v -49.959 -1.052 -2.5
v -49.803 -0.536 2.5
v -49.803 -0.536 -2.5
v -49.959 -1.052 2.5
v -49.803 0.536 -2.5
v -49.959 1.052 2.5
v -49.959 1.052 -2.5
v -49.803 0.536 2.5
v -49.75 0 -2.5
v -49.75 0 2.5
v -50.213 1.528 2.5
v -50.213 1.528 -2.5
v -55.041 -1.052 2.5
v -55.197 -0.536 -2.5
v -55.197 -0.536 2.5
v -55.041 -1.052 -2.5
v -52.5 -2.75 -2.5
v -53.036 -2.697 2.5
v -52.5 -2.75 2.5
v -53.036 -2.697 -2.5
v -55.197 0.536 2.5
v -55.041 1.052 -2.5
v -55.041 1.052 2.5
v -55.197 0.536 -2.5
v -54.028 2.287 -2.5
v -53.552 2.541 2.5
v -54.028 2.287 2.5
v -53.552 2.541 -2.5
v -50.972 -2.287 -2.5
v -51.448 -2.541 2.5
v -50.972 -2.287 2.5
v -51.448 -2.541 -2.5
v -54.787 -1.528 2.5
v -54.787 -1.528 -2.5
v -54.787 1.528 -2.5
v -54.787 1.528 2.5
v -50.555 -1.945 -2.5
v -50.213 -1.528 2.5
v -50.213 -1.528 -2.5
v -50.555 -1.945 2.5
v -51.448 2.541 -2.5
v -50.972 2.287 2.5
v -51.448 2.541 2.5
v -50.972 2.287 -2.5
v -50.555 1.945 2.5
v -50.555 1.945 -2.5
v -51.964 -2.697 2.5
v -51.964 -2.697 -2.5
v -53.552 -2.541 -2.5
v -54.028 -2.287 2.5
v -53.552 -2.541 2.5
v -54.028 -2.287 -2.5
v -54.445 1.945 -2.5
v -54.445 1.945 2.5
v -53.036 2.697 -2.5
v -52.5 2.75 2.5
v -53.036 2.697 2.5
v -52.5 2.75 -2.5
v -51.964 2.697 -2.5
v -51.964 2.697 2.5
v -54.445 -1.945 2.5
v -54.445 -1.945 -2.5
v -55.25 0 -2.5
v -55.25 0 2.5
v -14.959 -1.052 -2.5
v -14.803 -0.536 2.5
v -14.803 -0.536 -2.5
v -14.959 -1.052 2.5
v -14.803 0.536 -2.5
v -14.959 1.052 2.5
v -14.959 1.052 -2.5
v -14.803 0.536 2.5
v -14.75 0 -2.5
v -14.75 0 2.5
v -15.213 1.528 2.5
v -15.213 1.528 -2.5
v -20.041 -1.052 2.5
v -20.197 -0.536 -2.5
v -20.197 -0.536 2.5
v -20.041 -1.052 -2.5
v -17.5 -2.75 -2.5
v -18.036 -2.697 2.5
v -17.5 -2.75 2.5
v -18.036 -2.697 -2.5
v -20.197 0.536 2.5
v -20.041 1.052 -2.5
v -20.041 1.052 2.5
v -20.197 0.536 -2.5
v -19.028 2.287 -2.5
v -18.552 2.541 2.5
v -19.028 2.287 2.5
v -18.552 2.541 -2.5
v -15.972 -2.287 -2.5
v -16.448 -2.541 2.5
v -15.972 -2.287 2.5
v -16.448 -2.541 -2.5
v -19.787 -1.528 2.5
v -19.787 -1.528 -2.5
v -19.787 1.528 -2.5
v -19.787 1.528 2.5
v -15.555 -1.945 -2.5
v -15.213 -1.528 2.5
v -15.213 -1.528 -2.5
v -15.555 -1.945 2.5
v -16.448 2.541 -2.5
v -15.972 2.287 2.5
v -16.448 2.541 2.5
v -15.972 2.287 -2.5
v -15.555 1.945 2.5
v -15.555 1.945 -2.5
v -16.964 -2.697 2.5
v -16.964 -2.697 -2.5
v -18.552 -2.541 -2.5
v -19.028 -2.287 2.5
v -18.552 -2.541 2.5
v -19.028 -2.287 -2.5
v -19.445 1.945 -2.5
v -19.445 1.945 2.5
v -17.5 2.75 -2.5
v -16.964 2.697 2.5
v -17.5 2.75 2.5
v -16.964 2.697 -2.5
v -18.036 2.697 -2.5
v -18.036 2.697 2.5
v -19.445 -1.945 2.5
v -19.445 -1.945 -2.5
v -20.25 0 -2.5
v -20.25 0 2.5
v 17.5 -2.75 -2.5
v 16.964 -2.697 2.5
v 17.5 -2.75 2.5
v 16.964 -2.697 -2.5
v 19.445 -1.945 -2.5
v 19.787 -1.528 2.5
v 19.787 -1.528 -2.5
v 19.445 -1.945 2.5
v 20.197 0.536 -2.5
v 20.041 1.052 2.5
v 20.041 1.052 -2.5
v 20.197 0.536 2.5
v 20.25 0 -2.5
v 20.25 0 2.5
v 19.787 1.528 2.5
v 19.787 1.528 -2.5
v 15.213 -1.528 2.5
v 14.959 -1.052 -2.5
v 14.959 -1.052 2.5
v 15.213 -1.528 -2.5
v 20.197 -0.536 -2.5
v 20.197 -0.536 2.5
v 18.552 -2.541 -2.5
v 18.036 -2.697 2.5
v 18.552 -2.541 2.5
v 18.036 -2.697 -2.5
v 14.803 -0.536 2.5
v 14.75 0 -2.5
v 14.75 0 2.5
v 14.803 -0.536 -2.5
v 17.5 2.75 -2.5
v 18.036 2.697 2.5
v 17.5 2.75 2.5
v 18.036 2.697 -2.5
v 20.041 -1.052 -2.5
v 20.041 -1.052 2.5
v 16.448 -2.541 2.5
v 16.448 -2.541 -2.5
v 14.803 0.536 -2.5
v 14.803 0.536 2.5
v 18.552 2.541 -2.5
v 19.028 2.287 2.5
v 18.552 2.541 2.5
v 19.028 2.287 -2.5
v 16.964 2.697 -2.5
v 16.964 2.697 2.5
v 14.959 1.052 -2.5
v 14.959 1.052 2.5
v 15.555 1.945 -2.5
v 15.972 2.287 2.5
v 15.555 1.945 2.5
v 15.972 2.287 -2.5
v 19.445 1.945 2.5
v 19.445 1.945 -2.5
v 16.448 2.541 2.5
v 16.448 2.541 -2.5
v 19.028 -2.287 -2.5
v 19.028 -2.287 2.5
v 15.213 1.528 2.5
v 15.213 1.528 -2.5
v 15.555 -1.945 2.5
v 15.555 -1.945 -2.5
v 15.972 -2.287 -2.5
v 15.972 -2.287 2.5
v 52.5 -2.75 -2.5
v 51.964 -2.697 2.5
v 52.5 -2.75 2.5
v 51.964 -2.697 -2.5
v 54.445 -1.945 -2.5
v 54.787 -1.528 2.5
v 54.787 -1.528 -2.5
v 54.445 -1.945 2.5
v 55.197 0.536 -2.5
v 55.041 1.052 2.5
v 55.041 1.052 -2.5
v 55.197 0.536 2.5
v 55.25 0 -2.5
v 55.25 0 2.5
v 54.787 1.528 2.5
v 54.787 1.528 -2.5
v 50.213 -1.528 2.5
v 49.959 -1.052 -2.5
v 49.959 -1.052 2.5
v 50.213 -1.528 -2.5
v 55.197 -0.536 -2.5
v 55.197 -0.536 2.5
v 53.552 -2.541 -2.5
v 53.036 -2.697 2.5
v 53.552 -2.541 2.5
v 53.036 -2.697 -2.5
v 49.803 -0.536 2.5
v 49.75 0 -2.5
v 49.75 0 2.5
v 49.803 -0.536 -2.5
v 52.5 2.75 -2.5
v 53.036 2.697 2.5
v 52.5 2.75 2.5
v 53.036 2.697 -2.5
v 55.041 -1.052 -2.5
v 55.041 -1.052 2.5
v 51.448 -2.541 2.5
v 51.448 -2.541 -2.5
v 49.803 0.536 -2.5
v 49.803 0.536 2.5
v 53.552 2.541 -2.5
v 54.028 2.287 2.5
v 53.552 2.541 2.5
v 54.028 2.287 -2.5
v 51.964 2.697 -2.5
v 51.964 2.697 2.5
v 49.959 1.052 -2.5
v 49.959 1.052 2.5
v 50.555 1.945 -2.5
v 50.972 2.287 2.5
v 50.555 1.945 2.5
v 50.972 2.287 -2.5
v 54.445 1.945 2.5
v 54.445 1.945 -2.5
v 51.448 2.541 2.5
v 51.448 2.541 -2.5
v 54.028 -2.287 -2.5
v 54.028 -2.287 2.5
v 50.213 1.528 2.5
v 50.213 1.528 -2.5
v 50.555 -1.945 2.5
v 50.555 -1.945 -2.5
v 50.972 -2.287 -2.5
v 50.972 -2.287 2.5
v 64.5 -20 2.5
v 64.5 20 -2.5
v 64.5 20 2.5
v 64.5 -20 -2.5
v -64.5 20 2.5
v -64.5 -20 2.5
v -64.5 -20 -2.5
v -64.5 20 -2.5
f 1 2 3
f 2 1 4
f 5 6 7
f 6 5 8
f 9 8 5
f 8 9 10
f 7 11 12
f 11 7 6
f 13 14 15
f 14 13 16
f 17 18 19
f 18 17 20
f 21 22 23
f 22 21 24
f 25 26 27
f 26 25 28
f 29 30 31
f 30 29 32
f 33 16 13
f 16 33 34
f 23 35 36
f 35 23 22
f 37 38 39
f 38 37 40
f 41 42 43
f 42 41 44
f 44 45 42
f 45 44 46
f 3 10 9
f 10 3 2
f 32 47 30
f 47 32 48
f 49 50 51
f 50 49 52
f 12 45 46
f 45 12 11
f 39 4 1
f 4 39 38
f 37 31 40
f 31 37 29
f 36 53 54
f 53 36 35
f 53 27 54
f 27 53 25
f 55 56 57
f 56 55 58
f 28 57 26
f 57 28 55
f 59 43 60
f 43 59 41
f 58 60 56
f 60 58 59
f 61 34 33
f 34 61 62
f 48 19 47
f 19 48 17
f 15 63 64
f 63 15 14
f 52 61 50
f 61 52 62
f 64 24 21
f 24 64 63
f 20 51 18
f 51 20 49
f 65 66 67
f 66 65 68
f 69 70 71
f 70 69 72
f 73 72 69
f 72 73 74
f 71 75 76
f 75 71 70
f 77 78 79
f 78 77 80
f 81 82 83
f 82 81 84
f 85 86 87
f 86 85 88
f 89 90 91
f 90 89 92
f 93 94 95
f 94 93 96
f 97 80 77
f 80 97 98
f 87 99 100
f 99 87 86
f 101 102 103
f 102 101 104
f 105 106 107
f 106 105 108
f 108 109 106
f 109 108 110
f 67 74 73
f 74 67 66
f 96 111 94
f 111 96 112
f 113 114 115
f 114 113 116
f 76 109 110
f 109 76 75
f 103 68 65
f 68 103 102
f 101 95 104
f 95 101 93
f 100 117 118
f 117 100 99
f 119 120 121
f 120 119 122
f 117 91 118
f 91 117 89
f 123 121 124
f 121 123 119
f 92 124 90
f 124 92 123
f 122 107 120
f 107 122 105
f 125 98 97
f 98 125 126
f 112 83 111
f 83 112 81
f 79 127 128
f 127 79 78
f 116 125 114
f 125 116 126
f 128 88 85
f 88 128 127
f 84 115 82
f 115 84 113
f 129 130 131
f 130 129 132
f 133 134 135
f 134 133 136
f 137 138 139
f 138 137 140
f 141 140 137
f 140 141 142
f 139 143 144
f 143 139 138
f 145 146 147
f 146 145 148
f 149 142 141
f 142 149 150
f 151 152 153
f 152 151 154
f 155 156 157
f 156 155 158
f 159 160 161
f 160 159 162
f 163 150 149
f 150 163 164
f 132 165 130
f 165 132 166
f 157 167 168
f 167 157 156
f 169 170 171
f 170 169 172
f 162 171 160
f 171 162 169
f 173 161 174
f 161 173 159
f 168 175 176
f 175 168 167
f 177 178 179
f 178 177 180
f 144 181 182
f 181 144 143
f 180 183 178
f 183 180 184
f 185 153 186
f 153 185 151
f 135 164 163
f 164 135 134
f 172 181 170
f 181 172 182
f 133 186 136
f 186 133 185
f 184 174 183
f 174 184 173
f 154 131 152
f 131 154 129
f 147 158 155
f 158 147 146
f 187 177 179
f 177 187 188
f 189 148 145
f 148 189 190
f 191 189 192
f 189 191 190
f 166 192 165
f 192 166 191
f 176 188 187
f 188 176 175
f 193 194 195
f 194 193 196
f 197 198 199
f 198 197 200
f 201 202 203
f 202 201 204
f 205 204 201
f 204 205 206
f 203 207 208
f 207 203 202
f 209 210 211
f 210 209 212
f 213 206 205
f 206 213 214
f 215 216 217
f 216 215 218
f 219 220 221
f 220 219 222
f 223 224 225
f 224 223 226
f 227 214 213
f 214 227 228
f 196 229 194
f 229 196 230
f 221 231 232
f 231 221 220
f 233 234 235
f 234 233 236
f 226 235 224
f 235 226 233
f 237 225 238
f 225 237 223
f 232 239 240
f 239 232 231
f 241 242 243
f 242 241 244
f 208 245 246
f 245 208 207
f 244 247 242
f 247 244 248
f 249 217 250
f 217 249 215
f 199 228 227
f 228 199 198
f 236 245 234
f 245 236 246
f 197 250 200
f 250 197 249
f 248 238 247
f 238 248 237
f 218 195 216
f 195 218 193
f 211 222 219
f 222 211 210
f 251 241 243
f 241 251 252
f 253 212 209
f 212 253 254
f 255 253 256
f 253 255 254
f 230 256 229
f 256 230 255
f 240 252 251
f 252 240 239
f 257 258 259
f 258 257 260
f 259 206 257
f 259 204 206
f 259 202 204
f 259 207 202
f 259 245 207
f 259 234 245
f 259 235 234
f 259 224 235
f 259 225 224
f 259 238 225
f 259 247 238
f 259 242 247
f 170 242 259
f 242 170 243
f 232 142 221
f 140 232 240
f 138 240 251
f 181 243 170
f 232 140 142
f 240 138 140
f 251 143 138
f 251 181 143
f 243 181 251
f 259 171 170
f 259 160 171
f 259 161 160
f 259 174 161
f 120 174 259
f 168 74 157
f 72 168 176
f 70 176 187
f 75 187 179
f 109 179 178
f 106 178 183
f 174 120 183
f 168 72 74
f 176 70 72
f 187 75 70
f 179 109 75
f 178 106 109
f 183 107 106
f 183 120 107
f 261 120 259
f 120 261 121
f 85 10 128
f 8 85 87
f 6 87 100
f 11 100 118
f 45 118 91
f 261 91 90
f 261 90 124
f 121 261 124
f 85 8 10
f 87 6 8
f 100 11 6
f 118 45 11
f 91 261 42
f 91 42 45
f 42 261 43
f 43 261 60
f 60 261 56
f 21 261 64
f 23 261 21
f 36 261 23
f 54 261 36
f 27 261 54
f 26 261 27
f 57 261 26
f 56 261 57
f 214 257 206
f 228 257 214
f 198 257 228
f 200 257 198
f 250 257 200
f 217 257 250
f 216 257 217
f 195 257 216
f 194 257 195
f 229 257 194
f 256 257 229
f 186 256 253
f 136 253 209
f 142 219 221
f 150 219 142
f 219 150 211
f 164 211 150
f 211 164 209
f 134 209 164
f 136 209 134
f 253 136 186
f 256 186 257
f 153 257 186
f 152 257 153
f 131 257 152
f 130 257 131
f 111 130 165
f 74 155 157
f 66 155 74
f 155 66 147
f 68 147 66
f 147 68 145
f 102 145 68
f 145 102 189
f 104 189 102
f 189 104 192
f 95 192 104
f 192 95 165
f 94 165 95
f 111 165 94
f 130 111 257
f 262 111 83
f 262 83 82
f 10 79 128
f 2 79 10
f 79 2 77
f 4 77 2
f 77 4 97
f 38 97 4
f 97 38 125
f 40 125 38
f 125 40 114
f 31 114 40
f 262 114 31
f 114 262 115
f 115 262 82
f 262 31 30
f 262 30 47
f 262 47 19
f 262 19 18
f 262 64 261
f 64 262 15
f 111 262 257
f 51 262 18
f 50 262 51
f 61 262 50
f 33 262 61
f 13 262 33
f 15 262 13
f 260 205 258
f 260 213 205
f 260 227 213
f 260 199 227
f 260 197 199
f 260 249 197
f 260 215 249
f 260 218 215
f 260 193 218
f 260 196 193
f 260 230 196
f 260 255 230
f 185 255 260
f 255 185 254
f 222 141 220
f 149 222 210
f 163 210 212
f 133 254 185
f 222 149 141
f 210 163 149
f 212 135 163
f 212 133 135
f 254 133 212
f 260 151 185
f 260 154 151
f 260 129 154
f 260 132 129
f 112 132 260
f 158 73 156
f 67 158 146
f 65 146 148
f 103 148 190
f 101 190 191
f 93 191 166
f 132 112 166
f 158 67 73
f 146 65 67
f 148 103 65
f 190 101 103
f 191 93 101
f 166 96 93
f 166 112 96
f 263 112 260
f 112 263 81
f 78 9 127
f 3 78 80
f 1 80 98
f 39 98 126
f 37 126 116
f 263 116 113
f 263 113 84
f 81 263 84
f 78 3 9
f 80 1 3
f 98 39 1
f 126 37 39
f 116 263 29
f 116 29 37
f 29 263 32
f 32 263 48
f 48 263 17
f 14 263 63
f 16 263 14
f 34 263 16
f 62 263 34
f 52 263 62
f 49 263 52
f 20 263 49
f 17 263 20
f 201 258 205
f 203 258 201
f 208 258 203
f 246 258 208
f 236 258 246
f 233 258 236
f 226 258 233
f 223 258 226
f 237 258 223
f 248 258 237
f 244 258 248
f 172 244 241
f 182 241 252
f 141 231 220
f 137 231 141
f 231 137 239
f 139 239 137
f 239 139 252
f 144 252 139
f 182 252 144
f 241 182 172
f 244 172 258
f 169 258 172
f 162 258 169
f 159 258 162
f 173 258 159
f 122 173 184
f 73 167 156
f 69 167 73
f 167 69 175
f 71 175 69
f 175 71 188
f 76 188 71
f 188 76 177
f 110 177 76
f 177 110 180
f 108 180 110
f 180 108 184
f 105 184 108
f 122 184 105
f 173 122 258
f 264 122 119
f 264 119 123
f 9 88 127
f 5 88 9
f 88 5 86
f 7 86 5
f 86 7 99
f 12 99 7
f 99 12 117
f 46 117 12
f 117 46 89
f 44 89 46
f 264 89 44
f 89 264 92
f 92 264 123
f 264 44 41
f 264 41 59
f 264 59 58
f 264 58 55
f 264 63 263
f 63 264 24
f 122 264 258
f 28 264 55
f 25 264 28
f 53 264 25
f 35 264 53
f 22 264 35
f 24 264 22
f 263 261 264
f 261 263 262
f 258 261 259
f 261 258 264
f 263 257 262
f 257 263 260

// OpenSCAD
$fn = 32;

// ----------------------------------------------------------------------
// Hole bar, 4 x Ø5.5
// skip layout, 12 mm edge offset
// ----------------------------------------------------------------------

// --- parameters (mm) ---
bar_w = 40;         // bar width (Y)
bar_t = 5;          // bar thickness (Z)
holes = 4;          // holes per row
hole_d = 5.5;       // hole diameter
edge = 12;          // offset from the bar end to the first hole
grid_pitch = 17.5;  // grid the bar was laid out on

// --- derived feature positions (mm) ---
pitch = grid_pitch * 2;       // = 35   holes sit every other grid slot
span = (holes - 1) * pitch;   // = 105   distance between the end holes
bar_l = span + 2 * edge;      // = 129   overall bar length
start_x = -bar_l / 2 + edge;  // = -52.5   X of the first hole
feature_centers = [
  [start_x + 0 * pitch, 0],
  [start_x + 1 * pitch, 0],
  [start_x + 2 * pitch, 0],
  [start_x + 3 * pitch, 0]
];   // hole centres of the first row

// bar with one row of holes, drilled from feature_centers
difference() {
  translate([-bar_l / 2, -bar_w / 2, -bar_t / 2]) cube([bar_l, bar_w, bar_t]);
  for (centre = feature_centers)
    translate([centre[0], centre[1], 0])
      cylinder(d = hole_d, h = bar_t + 2, center = true);
}
